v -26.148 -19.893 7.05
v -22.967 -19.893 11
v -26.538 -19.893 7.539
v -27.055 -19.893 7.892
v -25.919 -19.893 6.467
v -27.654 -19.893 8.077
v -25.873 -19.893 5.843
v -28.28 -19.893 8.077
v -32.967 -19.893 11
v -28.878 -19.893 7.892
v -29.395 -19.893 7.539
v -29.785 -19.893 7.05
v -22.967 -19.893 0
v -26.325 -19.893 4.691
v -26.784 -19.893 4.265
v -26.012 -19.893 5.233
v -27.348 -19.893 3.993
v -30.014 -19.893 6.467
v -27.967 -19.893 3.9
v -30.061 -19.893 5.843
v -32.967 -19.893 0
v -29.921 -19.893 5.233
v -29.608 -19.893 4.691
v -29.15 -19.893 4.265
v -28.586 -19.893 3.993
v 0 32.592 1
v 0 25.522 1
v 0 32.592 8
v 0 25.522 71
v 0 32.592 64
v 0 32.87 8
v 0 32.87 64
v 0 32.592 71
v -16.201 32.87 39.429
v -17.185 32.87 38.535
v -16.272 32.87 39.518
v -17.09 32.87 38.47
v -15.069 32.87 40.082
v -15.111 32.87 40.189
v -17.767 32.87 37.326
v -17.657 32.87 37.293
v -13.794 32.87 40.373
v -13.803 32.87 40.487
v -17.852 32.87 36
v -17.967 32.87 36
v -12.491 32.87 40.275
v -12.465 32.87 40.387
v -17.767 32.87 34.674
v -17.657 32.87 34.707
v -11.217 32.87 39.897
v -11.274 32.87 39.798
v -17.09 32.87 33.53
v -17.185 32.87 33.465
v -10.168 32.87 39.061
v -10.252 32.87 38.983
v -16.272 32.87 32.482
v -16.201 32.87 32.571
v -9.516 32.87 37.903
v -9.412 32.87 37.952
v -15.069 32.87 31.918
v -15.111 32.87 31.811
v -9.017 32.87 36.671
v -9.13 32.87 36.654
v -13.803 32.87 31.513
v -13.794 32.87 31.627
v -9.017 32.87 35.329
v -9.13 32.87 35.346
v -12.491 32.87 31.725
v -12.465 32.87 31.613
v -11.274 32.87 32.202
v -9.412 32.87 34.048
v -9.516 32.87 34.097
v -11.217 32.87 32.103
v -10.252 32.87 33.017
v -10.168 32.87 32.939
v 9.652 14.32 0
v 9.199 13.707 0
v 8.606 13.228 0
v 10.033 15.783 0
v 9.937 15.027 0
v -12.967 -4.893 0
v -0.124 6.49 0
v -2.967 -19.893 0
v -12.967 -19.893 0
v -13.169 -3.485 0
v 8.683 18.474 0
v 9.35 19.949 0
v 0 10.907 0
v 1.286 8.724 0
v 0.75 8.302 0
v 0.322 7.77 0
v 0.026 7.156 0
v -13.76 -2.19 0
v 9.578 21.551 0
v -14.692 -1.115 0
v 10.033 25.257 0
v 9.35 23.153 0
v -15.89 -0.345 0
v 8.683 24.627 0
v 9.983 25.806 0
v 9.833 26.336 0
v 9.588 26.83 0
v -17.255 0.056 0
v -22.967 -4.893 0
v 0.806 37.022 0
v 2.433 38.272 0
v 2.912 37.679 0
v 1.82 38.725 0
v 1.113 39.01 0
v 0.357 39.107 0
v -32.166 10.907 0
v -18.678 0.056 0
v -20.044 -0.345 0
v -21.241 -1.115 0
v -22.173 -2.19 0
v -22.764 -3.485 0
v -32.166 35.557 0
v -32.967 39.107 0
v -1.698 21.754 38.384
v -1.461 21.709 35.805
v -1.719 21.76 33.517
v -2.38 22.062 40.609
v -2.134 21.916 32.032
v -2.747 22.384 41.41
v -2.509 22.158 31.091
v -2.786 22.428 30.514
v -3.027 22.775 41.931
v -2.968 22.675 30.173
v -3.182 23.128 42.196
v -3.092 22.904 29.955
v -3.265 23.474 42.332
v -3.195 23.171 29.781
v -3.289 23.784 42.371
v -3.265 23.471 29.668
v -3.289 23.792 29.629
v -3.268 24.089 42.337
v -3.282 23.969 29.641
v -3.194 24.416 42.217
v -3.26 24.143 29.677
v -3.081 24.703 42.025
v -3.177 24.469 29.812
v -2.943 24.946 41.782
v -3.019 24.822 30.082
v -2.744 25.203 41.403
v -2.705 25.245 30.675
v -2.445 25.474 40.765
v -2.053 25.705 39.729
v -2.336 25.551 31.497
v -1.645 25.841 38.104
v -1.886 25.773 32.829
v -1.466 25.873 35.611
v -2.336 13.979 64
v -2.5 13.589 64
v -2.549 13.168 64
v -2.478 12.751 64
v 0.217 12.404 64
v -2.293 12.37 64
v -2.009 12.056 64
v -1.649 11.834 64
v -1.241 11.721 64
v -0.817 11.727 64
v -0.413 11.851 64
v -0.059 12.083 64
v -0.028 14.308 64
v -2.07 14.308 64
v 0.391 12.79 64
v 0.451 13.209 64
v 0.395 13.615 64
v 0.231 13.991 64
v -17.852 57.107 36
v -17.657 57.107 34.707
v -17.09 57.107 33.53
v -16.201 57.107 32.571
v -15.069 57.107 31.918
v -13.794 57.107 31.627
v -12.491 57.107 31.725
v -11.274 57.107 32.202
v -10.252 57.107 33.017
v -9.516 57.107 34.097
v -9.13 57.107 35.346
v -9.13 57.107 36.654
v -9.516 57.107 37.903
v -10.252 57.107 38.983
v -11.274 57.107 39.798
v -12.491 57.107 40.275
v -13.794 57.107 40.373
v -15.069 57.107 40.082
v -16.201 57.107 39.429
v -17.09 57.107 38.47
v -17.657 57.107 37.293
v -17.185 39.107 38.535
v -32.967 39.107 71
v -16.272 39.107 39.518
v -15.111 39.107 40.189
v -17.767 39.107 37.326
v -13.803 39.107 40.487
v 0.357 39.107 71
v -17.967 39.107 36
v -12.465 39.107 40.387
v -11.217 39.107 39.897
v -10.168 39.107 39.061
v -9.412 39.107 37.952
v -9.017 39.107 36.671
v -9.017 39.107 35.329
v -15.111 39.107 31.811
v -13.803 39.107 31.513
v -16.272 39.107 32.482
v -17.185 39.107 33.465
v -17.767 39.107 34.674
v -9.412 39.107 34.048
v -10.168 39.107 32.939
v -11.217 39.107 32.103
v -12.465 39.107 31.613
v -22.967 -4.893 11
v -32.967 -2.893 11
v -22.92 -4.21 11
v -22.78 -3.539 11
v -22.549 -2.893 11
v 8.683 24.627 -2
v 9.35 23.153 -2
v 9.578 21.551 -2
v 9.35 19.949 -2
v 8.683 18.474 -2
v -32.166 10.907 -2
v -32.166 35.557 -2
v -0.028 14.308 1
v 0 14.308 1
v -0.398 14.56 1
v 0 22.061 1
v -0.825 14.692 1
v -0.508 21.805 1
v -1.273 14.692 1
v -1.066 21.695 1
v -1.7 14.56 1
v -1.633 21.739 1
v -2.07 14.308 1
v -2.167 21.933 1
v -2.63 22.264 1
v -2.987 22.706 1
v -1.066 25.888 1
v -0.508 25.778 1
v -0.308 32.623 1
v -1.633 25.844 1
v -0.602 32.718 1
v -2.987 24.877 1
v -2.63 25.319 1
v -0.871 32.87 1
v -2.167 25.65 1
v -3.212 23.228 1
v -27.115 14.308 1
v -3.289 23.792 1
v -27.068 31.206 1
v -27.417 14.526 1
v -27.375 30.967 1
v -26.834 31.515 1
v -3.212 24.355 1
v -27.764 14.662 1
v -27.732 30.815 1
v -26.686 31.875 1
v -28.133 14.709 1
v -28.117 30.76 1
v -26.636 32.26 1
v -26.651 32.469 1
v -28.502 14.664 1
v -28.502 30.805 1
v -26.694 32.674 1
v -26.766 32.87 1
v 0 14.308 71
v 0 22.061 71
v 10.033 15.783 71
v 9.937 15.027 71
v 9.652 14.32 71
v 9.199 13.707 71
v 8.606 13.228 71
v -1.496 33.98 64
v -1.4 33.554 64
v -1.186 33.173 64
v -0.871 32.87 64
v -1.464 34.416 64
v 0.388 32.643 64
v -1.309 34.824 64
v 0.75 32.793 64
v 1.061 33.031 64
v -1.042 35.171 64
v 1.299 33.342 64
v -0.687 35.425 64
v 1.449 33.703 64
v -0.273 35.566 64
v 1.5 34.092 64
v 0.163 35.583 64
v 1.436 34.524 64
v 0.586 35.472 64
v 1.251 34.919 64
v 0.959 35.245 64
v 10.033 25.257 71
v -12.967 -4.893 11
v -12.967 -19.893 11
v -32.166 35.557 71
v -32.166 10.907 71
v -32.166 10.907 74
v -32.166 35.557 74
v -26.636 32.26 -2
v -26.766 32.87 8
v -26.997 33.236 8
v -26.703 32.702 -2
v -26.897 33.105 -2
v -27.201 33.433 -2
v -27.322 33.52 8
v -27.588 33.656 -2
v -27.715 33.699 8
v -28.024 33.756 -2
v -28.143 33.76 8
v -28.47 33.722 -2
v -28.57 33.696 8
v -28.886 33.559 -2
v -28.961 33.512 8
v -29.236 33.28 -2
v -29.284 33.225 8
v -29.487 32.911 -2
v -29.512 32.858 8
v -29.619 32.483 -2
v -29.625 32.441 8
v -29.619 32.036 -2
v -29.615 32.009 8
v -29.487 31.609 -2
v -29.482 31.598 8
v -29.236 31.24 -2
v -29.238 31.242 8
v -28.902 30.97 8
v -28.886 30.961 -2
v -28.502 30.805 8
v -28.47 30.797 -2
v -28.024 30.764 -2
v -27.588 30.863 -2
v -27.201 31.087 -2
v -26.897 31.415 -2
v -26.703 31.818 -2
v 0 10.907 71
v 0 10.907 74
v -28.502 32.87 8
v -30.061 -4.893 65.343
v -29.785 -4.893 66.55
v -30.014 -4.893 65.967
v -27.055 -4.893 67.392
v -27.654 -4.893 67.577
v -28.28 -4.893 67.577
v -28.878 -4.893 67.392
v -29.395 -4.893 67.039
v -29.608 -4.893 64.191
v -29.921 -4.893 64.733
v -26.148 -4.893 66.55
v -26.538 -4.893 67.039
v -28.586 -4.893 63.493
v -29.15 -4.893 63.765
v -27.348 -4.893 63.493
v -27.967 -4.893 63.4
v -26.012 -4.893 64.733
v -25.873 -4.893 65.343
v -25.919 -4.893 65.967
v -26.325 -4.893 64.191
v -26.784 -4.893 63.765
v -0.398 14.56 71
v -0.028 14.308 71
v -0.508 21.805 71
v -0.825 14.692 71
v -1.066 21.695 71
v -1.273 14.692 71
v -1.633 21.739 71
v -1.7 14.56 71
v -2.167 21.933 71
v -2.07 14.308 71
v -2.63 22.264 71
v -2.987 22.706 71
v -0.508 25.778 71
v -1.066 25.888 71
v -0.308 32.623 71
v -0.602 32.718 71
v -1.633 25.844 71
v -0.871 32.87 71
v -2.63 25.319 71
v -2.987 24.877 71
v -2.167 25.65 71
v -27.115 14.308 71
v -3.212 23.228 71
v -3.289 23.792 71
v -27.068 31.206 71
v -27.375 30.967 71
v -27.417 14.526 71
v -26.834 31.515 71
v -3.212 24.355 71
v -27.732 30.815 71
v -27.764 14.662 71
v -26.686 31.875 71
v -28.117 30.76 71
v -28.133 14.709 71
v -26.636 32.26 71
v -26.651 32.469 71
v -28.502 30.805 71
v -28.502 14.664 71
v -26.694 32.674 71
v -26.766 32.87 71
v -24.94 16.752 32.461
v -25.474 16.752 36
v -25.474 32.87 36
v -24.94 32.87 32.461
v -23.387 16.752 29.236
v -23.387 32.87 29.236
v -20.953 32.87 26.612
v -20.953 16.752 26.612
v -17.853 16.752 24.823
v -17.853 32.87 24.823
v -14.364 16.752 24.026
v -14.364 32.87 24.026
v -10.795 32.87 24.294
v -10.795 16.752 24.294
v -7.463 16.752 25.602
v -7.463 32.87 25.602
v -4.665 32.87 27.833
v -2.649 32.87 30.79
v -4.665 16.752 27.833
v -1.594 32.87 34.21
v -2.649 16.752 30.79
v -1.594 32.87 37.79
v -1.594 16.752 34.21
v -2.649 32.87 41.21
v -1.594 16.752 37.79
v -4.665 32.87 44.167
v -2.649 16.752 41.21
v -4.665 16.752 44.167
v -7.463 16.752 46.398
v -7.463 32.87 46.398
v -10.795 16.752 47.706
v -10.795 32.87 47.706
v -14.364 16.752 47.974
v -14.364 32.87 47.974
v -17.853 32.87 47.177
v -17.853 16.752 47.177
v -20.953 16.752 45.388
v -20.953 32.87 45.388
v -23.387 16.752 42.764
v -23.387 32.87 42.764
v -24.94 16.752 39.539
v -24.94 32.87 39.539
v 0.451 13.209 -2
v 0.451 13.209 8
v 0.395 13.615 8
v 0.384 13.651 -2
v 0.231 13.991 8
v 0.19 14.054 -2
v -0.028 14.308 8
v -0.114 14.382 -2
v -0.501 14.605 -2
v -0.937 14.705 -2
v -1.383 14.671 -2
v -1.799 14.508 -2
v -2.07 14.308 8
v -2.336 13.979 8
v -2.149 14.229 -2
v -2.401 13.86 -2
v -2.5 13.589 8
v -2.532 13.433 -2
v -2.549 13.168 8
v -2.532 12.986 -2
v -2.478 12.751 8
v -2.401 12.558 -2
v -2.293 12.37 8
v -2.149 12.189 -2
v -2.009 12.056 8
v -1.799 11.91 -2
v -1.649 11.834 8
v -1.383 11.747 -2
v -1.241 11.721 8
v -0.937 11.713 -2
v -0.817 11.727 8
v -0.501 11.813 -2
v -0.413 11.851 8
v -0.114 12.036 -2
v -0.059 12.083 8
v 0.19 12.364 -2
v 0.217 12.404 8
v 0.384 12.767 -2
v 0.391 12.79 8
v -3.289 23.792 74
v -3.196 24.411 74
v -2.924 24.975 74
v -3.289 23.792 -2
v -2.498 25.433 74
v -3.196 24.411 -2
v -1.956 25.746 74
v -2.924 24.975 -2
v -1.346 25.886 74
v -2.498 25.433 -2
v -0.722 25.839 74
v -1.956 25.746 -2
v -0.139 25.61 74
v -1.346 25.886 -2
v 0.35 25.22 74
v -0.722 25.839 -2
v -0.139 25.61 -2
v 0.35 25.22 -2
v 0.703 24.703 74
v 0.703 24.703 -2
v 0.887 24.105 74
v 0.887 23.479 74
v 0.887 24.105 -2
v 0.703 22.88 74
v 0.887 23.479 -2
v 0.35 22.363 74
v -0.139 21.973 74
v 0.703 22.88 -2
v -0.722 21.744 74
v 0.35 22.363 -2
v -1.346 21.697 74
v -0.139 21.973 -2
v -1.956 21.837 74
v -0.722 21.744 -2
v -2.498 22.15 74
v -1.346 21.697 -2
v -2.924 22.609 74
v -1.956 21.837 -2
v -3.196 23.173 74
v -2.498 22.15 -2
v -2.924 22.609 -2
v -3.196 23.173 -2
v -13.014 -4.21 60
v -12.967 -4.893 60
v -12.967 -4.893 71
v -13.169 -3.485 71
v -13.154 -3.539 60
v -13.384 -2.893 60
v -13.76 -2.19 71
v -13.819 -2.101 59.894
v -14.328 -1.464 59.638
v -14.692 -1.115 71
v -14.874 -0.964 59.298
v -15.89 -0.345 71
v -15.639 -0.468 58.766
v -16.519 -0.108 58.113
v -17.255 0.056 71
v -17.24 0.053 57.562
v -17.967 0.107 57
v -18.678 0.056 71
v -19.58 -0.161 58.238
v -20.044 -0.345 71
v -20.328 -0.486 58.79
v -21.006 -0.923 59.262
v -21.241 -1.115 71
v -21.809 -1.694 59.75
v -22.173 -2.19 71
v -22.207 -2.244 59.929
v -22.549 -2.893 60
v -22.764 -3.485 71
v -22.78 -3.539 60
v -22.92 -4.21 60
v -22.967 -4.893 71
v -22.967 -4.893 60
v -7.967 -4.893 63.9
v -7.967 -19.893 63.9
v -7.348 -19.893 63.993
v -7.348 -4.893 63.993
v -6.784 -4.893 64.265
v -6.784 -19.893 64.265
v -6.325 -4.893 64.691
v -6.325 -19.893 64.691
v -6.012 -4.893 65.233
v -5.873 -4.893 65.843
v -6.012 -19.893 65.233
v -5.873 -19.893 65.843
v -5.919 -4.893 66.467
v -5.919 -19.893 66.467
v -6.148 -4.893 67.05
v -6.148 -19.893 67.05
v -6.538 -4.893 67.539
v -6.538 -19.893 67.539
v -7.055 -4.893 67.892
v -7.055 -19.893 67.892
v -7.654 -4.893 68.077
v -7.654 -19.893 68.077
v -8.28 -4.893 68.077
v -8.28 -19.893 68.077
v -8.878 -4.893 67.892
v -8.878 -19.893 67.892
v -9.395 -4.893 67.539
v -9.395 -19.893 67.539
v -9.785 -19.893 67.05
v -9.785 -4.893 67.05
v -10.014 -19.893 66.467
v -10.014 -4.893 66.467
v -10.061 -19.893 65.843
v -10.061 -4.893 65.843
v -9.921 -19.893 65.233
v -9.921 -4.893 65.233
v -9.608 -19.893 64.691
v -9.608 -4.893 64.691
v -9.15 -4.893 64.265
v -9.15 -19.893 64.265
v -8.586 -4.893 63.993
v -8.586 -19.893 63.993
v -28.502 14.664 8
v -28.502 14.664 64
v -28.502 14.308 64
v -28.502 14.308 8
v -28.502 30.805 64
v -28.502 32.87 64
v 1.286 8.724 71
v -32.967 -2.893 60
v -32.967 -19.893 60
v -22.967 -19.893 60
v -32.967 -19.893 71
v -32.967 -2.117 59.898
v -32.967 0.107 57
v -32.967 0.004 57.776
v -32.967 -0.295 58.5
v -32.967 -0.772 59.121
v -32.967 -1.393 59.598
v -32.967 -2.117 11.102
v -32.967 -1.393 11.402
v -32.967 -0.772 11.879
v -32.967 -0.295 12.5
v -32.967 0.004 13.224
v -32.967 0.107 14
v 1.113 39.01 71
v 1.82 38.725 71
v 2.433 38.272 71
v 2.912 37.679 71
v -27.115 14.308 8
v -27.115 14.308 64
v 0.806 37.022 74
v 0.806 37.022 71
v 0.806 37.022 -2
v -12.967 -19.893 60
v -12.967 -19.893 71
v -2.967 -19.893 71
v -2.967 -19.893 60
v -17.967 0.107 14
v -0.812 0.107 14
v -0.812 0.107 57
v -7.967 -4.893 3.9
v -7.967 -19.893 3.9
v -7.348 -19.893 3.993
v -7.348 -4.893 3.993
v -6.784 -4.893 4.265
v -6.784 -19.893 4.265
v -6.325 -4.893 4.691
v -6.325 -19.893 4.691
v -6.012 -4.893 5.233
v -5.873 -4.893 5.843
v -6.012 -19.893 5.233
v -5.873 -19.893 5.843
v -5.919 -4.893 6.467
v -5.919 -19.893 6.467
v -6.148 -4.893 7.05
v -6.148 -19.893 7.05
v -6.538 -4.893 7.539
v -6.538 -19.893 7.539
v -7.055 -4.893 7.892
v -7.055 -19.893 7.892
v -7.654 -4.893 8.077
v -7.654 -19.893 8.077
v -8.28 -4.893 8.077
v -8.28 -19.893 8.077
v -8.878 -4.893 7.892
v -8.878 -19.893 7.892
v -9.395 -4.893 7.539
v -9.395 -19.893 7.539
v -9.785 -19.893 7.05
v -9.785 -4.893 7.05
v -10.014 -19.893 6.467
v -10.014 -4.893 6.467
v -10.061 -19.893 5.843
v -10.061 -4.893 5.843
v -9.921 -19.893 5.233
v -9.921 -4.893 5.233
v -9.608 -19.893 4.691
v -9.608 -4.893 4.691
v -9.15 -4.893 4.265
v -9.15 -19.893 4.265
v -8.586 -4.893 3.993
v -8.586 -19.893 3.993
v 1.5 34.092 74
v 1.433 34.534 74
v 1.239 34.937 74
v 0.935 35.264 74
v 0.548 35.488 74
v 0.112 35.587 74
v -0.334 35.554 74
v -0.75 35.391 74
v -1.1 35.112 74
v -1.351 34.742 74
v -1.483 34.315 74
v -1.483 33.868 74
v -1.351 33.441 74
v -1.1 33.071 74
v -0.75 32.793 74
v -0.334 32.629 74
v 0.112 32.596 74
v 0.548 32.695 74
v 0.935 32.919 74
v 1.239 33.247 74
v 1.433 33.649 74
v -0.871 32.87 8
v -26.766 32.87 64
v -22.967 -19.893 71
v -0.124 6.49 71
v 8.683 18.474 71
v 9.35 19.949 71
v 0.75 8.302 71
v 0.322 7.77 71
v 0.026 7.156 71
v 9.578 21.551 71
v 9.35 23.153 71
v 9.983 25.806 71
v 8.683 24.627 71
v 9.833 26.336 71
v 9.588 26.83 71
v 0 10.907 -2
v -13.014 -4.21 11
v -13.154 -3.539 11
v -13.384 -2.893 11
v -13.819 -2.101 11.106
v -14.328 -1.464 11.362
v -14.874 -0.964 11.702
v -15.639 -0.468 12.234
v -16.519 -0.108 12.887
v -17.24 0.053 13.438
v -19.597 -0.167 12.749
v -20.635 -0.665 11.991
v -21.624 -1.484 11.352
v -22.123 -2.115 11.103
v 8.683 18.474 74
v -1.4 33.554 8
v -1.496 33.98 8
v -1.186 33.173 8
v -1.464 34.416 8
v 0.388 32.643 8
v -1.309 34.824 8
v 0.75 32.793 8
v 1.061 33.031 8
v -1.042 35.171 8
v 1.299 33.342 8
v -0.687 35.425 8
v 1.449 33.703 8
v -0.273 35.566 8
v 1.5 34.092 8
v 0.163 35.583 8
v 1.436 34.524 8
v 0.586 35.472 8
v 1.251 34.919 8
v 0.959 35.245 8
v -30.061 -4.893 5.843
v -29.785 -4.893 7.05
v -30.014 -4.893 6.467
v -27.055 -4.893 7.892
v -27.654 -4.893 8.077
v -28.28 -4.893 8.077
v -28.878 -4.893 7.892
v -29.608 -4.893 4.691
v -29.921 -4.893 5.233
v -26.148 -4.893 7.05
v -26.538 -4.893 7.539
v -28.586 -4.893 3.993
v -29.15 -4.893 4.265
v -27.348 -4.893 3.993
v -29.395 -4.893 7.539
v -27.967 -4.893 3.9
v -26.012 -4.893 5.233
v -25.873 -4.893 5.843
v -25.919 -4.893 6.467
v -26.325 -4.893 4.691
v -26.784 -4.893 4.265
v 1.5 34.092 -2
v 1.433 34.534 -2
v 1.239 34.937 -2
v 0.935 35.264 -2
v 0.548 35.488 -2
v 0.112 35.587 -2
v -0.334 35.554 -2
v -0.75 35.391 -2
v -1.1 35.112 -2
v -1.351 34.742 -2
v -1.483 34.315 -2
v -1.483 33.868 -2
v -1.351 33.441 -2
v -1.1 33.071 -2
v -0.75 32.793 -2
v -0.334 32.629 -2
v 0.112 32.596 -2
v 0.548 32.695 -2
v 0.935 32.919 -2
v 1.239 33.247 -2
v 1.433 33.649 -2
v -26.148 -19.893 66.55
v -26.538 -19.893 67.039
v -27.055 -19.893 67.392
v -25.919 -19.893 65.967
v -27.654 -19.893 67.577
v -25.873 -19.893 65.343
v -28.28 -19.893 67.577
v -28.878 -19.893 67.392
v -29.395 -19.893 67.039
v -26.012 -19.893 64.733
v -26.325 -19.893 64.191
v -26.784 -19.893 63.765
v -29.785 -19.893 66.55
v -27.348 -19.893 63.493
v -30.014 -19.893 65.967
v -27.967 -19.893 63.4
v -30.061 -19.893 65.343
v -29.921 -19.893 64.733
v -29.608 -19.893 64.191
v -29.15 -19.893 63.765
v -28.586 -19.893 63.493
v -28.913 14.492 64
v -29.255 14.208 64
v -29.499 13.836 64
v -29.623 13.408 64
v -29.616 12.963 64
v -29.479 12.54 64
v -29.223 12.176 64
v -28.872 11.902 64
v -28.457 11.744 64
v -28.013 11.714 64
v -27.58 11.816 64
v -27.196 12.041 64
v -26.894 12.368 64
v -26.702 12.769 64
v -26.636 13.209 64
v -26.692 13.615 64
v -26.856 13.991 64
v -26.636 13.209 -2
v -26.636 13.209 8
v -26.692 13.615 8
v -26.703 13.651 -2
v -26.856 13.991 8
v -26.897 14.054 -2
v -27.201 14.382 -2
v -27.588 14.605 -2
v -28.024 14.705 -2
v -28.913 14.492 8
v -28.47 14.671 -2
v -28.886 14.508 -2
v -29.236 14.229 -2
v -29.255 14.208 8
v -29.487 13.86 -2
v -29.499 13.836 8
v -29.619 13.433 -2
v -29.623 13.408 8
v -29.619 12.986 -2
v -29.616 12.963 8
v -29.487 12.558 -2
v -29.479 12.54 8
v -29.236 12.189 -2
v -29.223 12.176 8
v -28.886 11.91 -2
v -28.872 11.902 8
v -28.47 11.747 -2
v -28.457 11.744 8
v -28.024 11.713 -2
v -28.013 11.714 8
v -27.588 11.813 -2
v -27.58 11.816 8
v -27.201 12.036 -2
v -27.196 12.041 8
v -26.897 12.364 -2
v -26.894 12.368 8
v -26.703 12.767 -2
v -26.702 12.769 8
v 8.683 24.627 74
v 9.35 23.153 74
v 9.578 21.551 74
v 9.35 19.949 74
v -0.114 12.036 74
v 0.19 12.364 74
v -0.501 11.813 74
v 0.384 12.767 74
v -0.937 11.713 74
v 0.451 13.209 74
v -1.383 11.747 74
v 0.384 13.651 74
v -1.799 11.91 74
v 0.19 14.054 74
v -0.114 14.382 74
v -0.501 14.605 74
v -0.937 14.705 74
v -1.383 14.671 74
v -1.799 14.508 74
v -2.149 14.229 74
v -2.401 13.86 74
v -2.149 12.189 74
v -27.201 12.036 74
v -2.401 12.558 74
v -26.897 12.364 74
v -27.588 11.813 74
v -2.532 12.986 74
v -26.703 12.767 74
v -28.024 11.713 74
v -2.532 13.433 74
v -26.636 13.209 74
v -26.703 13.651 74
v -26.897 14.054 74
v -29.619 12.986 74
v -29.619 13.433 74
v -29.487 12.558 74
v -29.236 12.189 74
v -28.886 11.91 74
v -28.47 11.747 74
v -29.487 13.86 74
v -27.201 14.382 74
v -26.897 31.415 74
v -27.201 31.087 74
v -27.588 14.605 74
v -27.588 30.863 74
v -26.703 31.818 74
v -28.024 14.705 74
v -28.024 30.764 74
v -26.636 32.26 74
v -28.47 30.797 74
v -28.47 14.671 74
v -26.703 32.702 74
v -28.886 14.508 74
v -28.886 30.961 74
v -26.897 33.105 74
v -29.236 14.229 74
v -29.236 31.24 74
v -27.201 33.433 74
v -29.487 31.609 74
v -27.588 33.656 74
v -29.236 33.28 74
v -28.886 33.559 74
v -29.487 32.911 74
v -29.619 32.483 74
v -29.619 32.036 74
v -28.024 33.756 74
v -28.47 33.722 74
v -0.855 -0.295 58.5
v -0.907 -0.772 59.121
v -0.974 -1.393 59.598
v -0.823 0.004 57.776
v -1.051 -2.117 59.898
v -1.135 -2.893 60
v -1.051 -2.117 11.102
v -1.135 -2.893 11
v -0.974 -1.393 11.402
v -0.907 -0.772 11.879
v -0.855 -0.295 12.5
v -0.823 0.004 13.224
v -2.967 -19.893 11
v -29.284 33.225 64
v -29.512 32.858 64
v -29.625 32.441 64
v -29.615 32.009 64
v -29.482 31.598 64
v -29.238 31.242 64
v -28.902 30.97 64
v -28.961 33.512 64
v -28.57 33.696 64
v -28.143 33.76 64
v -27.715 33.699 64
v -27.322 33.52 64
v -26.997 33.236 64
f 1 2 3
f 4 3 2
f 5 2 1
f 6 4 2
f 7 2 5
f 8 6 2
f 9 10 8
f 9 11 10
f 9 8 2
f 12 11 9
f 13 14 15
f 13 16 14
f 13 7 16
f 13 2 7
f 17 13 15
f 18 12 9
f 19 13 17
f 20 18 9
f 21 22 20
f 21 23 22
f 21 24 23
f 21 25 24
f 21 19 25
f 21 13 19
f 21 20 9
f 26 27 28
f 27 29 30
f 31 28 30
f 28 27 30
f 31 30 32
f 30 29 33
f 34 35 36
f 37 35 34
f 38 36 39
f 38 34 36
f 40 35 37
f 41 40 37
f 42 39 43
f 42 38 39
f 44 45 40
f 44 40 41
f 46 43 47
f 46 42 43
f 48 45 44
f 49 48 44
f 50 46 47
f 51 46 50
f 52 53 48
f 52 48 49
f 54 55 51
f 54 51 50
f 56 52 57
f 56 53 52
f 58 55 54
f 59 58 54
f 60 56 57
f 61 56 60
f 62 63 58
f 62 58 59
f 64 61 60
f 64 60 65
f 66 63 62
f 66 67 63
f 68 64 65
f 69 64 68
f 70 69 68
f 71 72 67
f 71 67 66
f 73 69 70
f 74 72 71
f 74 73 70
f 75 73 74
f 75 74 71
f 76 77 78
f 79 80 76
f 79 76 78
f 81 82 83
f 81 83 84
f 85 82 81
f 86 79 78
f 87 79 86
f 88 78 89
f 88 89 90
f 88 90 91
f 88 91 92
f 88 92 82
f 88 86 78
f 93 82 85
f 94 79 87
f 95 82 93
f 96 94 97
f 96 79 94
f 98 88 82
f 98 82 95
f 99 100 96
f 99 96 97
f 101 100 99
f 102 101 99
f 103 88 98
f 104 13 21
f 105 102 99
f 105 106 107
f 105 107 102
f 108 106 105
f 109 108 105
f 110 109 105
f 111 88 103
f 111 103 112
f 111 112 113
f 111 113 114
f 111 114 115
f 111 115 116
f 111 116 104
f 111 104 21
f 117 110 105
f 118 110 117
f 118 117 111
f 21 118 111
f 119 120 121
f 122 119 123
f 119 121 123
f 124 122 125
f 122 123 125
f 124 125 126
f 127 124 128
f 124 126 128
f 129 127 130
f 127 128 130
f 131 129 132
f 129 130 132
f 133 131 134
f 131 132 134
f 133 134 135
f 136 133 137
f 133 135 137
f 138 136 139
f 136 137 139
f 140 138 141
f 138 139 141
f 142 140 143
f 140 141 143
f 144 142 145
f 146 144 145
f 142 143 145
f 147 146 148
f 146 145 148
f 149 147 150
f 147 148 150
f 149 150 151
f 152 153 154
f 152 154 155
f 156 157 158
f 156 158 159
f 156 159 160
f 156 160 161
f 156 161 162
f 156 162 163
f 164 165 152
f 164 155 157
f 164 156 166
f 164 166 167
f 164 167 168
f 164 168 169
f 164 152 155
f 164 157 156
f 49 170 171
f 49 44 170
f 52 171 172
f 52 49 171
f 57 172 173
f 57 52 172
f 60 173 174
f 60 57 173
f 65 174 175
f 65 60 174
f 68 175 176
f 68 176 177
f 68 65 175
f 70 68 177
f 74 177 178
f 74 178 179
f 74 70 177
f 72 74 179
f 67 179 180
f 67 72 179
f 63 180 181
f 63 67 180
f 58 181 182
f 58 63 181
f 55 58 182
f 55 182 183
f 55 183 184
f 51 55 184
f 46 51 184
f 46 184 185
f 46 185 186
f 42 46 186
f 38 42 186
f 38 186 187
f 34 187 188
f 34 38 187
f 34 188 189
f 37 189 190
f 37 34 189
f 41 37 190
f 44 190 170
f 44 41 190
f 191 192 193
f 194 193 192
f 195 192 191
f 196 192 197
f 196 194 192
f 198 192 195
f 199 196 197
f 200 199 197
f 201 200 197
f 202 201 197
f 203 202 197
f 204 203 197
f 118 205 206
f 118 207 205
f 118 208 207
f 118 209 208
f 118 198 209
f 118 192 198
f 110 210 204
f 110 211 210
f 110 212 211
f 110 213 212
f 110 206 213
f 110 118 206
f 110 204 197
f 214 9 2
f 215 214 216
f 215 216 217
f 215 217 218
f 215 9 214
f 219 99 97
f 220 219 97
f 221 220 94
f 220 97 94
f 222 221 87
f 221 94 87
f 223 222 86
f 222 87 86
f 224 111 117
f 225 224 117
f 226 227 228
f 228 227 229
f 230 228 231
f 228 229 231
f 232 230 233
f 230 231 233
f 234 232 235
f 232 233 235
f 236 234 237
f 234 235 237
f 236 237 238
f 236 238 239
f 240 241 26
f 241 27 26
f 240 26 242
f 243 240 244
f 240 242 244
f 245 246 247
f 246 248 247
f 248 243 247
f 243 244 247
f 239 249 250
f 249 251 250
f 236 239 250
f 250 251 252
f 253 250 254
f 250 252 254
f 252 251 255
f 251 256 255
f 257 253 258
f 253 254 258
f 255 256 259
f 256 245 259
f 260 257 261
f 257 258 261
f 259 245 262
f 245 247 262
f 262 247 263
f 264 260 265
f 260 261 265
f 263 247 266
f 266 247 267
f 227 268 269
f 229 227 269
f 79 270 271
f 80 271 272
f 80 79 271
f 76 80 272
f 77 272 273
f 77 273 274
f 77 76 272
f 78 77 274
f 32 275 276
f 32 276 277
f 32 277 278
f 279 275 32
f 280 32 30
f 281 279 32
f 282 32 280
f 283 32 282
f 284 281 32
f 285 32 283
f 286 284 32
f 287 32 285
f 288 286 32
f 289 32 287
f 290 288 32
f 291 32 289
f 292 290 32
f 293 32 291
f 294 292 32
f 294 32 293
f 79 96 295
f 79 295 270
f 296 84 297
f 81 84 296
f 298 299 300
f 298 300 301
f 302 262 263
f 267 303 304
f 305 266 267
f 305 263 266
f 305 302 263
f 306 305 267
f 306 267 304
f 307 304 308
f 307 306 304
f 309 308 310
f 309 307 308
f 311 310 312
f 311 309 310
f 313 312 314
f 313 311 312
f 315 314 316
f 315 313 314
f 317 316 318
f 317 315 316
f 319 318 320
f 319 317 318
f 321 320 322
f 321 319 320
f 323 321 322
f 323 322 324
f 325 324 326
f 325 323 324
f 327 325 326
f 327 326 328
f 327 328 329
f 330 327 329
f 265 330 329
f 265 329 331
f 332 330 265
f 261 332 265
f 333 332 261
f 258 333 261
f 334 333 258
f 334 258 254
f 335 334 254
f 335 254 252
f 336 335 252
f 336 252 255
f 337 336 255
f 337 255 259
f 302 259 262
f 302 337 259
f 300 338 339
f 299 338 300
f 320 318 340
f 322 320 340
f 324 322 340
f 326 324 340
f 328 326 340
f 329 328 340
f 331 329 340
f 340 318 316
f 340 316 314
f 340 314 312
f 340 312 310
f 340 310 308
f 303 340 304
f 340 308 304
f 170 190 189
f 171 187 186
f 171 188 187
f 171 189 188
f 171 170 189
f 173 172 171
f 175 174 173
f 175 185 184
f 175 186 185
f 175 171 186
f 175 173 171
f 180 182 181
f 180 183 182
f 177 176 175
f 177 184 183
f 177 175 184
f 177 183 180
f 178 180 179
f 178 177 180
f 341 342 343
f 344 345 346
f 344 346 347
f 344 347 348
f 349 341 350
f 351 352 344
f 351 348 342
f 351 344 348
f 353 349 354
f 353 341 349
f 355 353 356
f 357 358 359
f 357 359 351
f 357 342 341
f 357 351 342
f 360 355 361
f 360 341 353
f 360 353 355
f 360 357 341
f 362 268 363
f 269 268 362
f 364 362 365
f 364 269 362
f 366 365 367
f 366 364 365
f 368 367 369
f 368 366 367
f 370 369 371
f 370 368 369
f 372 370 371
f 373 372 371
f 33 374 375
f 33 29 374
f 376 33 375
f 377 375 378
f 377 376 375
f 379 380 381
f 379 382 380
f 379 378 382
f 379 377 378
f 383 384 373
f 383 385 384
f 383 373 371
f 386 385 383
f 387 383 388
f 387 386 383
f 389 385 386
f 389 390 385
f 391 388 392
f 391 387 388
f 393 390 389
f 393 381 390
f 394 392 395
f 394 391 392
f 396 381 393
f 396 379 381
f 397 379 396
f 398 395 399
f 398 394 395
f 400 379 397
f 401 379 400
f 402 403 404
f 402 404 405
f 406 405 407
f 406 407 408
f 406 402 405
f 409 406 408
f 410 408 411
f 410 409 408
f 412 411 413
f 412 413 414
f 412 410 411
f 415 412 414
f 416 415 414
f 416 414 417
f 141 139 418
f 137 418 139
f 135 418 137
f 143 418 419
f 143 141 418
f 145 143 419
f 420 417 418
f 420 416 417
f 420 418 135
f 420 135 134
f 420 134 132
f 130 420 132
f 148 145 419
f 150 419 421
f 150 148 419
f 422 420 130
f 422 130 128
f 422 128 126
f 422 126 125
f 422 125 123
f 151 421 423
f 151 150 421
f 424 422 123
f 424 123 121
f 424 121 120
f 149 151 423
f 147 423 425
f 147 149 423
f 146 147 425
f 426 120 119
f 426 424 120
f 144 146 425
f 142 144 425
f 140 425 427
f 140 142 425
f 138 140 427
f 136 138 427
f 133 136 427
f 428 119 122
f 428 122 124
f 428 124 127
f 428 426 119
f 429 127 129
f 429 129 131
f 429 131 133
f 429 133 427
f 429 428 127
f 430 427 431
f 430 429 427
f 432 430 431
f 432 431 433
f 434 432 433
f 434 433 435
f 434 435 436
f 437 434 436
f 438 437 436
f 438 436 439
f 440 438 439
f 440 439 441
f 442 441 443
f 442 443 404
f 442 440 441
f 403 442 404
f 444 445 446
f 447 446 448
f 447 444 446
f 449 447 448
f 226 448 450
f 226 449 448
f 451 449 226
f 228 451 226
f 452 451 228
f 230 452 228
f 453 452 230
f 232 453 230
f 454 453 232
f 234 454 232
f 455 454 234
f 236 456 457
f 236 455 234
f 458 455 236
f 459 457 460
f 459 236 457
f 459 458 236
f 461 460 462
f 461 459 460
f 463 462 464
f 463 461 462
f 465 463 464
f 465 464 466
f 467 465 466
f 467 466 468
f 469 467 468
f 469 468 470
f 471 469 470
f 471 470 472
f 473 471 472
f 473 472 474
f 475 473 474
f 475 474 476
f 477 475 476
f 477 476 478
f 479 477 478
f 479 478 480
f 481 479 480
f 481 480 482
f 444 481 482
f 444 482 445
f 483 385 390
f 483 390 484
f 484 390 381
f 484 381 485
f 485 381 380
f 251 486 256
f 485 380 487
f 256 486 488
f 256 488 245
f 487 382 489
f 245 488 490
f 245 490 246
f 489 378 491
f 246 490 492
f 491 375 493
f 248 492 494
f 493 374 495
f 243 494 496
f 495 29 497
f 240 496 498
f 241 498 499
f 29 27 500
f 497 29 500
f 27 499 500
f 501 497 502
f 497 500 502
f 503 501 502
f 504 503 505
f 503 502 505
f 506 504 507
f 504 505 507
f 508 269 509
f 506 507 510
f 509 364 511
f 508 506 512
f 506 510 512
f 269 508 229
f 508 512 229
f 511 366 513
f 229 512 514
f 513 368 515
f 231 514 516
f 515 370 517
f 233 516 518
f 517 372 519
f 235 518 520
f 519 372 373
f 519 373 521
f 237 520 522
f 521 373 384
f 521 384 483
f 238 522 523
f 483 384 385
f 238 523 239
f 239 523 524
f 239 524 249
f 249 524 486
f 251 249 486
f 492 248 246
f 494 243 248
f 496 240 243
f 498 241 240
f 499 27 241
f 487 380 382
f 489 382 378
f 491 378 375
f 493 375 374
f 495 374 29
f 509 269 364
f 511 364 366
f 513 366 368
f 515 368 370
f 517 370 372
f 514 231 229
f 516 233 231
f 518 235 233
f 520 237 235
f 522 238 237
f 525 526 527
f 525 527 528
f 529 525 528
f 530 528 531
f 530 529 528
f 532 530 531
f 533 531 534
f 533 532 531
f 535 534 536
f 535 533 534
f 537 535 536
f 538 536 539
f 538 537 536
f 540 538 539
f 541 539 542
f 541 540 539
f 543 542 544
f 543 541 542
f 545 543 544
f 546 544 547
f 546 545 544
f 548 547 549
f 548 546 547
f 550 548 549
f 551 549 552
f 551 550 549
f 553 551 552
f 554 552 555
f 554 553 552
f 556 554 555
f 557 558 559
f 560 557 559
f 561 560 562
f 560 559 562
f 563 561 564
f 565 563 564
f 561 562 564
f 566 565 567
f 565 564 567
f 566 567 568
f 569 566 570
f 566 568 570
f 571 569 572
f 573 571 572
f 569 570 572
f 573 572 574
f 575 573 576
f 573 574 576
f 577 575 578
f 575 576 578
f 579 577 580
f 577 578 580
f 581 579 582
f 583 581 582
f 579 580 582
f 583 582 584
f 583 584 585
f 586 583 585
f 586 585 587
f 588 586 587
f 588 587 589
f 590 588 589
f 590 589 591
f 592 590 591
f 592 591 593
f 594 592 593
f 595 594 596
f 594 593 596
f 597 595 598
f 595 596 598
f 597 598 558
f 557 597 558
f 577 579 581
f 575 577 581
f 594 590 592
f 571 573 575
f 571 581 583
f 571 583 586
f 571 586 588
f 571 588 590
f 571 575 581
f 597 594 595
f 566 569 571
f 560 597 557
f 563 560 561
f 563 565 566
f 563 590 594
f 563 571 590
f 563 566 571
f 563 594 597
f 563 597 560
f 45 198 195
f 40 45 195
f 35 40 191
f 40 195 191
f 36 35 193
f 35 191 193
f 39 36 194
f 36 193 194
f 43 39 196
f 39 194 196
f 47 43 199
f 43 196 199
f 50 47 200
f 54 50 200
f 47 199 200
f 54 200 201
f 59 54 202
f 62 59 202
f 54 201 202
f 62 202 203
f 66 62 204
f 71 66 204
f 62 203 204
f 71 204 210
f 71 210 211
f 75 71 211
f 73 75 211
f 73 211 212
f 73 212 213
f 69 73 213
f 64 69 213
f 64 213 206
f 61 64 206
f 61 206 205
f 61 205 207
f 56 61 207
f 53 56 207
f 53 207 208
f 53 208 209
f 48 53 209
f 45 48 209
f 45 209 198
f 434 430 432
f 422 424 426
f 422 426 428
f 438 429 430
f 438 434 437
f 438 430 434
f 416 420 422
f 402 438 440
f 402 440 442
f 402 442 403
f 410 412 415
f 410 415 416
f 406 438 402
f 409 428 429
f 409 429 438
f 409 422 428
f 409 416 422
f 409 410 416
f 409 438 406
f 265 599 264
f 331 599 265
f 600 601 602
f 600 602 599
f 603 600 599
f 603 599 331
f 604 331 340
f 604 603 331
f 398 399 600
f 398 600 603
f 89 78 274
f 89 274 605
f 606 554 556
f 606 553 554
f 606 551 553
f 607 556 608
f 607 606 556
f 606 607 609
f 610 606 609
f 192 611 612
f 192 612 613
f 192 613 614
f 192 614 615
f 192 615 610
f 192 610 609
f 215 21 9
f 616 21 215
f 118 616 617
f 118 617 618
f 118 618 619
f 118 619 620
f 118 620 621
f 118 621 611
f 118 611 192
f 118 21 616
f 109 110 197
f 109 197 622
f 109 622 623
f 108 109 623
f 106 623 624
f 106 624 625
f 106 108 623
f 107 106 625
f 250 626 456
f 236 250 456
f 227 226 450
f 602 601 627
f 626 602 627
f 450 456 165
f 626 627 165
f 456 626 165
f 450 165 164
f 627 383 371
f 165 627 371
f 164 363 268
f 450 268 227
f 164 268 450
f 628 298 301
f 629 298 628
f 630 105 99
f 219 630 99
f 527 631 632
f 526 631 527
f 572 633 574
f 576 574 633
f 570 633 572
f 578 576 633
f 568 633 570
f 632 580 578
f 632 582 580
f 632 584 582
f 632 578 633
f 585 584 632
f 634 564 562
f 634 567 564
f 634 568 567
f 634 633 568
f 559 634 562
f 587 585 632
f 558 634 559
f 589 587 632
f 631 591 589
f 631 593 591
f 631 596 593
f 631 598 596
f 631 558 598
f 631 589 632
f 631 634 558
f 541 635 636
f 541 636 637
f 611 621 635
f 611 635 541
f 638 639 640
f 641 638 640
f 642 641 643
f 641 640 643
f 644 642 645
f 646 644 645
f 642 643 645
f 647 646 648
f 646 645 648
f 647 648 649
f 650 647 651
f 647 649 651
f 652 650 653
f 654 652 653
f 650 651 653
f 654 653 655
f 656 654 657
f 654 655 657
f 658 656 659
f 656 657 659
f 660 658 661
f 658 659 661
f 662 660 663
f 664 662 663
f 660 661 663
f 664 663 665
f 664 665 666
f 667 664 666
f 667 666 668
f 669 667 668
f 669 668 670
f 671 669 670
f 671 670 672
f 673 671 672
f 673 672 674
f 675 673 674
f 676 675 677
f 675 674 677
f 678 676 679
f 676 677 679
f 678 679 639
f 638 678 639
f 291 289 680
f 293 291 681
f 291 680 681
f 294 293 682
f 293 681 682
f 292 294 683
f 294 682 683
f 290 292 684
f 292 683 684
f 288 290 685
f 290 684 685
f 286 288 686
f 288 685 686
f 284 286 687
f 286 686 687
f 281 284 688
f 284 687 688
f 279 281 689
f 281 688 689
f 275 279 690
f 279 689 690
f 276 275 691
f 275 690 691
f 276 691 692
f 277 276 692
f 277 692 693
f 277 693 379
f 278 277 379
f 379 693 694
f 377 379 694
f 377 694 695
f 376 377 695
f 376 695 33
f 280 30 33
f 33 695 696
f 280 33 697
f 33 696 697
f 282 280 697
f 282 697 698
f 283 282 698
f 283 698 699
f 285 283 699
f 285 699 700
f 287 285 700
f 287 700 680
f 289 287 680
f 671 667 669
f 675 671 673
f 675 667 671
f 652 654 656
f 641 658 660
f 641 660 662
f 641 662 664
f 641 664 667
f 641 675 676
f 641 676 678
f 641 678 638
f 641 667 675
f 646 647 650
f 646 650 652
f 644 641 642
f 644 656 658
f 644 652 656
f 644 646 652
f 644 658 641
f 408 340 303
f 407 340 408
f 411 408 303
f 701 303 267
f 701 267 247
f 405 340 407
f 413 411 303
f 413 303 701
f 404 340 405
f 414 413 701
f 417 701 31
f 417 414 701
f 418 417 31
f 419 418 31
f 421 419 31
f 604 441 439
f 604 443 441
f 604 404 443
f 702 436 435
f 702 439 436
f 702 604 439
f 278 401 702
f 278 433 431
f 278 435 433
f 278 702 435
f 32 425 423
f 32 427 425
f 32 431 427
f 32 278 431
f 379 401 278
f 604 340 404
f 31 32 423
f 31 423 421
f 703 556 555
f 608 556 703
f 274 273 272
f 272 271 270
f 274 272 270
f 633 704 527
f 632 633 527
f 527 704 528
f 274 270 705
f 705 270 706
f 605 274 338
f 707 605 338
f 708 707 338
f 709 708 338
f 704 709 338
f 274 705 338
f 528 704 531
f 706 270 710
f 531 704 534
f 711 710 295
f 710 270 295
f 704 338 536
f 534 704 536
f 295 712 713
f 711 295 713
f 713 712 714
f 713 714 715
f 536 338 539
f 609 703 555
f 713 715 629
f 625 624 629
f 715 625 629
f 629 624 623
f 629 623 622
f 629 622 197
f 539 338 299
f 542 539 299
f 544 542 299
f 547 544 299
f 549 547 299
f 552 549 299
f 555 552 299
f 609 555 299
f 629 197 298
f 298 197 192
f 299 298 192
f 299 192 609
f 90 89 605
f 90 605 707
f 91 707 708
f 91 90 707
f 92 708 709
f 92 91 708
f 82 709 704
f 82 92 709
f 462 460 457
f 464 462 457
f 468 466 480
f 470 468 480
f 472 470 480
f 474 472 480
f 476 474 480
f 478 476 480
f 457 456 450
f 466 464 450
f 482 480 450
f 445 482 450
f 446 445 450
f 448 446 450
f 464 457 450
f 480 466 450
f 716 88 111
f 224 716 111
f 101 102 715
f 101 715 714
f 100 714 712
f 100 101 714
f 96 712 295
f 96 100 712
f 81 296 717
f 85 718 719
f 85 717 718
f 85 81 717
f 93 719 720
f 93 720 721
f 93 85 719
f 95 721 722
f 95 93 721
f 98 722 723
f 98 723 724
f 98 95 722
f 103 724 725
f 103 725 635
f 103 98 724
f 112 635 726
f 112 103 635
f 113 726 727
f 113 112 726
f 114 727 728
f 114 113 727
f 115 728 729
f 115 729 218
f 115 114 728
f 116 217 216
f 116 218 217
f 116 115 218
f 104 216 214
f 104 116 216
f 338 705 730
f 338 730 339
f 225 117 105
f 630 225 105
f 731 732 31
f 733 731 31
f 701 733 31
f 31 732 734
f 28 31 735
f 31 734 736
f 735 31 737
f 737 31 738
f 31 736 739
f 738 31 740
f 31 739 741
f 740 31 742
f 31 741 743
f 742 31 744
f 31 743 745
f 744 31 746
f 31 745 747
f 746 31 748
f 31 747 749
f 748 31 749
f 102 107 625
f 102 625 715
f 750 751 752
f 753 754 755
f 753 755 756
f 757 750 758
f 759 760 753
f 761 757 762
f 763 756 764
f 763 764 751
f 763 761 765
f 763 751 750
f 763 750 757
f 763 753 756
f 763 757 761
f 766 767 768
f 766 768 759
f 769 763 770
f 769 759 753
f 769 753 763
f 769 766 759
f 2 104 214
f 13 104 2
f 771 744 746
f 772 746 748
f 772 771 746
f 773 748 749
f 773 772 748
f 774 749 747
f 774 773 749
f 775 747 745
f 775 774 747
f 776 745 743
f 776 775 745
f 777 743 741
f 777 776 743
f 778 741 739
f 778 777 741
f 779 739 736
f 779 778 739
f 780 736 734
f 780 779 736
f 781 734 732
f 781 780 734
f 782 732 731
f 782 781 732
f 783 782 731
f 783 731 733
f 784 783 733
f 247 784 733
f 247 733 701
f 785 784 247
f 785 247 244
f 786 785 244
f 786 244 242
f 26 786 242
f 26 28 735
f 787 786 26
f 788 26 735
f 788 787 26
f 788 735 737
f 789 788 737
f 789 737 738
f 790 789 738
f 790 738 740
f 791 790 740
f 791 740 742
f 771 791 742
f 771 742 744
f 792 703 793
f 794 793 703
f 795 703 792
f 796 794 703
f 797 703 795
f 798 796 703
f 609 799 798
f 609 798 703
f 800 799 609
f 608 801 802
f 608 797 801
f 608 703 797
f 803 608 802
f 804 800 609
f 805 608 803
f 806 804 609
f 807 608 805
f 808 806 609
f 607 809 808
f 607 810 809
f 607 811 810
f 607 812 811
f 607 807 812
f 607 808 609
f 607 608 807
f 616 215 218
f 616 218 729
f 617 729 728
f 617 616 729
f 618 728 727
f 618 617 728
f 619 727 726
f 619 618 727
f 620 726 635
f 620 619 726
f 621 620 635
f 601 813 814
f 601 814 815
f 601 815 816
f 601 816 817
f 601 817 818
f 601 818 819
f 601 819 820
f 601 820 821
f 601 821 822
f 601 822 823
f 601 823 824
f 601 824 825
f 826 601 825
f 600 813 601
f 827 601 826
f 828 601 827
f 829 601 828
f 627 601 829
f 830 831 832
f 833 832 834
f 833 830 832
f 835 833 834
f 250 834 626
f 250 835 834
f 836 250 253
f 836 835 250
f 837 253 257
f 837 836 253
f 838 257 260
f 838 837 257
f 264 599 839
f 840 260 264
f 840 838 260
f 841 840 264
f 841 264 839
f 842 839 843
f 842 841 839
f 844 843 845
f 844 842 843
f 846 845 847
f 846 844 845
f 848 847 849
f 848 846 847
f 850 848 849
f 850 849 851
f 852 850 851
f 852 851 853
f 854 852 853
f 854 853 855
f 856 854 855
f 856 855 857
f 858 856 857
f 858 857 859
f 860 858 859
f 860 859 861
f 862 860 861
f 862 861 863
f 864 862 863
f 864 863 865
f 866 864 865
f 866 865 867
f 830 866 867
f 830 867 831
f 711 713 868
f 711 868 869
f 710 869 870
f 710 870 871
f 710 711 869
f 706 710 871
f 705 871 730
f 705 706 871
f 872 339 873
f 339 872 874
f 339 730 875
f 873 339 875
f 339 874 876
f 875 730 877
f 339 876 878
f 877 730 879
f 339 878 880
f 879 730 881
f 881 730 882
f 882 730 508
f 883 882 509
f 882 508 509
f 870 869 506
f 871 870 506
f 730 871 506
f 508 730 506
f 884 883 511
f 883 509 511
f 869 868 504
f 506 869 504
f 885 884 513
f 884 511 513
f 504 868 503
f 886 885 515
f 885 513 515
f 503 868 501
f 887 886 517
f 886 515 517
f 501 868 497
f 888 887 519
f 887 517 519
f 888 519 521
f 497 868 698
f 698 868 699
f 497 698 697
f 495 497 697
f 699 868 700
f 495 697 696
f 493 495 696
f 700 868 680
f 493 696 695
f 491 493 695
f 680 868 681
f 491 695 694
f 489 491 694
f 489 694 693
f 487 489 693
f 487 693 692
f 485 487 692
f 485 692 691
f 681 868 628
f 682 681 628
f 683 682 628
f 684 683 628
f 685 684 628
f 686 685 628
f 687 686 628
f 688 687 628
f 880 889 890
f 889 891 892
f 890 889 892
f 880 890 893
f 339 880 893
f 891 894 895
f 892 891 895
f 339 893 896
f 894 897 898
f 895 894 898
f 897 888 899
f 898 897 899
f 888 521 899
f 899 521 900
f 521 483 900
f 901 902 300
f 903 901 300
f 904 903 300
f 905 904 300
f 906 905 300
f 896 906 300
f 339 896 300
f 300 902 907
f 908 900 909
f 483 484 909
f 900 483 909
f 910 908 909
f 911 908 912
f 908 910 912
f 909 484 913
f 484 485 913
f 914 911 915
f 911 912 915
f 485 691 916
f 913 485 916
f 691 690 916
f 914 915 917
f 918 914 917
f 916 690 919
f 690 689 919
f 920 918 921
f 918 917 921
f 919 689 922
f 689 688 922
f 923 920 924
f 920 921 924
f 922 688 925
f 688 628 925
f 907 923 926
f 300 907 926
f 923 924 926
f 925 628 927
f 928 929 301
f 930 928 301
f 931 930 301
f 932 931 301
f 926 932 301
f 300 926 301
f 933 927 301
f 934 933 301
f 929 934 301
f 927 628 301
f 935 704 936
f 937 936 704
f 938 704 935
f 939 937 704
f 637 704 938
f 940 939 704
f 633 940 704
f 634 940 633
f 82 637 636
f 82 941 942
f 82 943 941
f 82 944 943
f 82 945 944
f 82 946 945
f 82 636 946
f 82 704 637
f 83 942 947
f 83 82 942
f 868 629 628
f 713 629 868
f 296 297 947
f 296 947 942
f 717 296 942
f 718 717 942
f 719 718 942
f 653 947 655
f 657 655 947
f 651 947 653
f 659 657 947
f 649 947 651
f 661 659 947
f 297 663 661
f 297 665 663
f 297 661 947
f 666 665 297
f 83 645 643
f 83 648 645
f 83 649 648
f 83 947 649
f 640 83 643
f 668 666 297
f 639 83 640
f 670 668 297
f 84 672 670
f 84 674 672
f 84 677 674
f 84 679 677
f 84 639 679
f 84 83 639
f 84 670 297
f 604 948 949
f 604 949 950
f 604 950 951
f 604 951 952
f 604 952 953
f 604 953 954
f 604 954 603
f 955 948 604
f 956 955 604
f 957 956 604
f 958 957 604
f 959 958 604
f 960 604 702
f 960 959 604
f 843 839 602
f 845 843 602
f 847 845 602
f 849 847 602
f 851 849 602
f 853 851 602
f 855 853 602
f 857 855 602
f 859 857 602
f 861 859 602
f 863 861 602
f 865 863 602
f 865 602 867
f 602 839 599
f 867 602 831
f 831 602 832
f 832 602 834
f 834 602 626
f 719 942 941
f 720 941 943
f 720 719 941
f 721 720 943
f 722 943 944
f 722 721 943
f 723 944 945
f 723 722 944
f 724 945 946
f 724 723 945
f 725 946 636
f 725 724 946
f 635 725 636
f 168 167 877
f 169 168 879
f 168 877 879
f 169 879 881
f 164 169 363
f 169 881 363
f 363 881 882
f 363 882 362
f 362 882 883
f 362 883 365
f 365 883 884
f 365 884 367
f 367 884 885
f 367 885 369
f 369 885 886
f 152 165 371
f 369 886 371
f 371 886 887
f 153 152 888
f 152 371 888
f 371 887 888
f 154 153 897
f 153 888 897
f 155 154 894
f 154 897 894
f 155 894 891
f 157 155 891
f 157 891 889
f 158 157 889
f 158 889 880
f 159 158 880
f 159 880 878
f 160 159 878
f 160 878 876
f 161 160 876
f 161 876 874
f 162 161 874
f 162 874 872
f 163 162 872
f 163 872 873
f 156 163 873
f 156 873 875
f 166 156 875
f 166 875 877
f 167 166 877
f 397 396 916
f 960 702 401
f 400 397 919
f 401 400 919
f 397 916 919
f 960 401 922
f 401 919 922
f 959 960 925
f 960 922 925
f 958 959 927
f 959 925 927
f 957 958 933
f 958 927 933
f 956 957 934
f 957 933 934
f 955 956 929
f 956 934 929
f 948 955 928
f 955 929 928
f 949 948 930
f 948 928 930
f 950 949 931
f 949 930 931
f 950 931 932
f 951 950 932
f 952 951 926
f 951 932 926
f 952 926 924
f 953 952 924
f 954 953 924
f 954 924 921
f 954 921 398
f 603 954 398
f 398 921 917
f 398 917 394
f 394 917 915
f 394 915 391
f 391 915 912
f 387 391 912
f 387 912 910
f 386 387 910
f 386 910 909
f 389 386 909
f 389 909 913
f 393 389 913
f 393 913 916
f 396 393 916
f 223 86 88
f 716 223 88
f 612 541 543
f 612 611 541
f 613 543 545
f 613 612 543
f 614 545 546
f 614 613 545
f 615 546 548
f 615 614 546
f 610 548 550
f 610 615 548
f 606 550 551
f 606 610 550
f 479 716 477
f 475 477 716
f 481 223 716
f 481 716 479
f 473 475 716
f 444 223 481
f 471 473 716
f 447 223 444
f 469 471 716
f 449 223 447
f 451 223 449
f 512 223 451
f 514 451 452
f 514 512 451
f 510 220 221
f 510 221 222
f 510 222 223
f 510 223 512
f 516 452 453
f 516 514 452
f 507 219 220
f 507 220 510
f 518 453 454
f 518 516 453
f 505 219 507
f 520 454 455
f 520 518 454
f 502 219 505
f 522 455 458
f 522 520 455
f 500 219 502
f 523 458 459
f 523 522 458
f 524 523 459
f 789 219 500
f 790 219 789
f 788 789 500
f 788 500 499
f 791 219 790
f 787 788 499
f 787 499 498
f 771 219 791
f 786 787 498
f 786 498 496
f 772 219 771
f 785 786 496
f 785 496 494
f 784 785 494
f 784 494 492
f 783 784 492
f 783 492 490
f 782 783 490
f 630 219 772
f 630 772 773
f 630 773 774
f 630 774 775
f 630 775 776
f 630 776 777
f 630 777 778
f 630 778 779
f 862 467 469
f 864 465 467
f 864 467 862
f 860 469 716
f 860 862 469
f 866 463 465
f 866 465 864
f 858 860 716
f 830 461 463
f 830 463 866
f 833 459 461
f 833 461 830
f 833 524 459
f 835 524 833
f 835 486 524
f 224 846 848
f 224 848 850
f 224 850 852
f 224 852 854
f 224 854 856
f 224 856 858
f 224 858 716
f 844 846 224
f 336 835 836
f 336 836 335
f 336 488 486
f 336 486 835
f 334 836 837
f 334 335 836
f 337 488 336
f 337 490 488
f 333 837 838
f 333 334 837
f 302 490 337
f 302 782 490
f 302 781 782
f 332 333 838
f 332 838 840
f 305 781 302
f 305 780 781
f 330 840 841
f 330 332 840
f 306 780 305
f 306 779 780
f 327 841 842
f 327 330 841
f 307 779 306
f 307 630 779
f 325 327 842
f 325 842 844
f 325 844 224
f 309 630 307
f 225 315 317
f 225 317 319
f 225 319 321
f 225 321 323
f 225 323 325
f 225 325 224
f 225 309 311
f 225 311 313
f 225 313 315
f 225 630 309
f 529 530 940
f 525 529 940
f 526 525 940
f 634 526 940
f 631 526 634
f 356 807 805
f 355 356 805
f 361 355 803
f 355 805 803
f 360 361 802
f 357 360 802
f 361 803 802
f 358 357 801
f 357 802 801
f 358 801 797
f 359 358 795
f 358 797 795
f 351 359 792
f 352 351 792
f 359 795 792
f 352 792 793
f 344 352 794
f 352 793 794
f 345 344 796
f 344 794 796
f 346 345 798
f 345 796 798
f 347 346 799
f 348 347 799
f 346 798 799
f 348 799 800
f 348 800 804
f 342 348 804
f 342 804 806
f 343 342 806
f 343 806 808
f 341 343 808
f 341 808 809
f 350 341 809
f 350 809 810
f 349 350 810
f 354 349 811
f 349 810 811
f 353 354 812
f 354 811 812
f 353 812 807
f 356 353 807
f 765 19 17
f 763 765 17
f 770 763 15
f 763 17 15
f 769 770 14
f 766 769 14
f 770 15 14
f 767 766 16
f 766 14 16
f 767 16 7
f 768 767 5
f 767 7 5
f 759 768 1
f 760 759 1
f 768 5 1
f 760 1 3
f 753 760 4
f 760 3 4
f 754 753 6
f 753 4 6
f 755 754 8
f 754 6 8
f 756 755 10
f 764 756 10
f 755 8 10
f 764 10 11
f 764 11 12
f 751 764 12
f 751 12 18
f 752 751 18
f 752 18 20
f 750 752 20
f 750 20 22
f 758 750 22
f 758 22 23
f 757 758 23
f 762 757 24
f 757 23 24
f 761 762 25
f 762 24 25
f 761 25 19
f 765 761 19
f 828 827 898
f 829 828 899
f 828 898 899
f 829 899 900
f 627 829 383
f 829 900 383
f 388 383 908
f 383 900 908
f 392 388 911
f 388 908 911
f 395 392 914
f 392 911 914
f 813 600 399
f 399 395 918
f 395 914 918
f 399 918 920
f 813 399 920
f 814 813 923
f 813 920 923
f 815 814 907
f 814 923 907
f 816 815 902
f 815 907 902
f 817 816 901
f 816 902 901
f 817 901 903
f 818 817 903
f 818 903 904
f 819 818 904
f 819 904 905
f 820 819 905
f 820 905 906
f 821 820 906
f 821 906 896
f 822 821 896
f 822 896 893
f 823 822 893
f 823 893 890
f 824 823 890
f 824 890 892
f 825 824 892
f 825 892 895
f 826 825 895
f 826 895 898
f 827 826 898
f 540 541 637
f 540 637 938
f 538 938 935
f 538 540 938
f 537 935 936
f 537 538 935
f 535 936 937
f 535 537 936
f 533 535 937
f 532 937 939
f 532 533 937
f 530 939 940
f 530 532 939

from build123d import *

# Parameters (mm, degrees)
EXTRUDE_1_DEPTH     = 71
CUT_EXTRUDE_2_DEPTH = 71
SKETCH_3_W          = 28.502340284
SKETCH_3_H          = 18.562195974
CUT_EXTRUDE_3_DEPTH = 71
EXTRUDE_4_DEPTH     = 3
SKETCH_5_R          = 1.5
CUT_EXTRUDE_5_DEPTH = 10
SKETCH_6_R          = 4.5
CUT_EXTRUDE_6_DEPTH = 10
SKETCH_8_R          = 2.1
CUT_EXTRUDE_7_DEPTH = 15
SKETCH_9_R          = 2.1
CUT_EXTRUDE_8_DEPTH = 101.617881054


with BuildPart() as part:
    # 草图1 → 拉伸1 (new body)
    with BuildSketch(Plane.XY):
        with BuildLine():
            Line((-32.966640689, -19.89344536), (-32.966640689, 39.10655464))
            Line((-32.966640689, 39.10655464), (0.356973729, 39.10655464))
            ThreePointArc((0.356973729, 39.10655464), (1.820381254, 38.725416686), (2.911948679, 37.678846917))
            Line((2.911948679, 37.678846917), (9.588334261, 26.829720346))
            ThreePointArc((9.588334261, 26.829720346), (9.919959807, 26.074457796), (10.033359311, 25.257428069))
            Line((10.033359311, 25.257428069), (10.033359311, 15.782940222))
            ThreePointArc((10.033359311, 15.782940222), (9.652221357, 14.319532697), (8.605651588, 13.227965272))
            Line((8.605651588, 13.227965272), (1.286230543, 8.723706168))
            ThreePointArc((1.286230543, 8.723706168), (0.321919702, 7.770494191), (-0.124217104, 6.490076126))
            Line((-0.124217104, 6.490076126), (-2.966640689, -19.89344536))
            Line((-2.966640689, -19.89344536), (-12.966640689, -19.89344536))
            Line((-12.966640689, -19.89344536), (-12.966640689, -4.89344536))
            ThreePointArc((-12.966640689, -4.89344536), (-17.966640689, 0.10655464), (-22.966640689, -4.89344536))
            Line((-22.966640689, -4.89344536), (-22.966640689, -19.89344536))
            Line((-22.966640689, -19.89344536), (-32.966640689, -19.89344536))
        make_face()
    extrude(amount=EXTRUDE_1_DEPTH)

    # 草图2 → 拉伸2 (cut)
    with BuildSketch(Plane.ZY.offset(32.966640689)):
        with BuildLine():
            Line((11, -19.89344536), (11, -2.89344536))
            ThreePointArc((11, -2.89344536), (11.878679656, -0.772125016), (14, 0.10655464))
            Line((14, 0.10655464), (57, 0.10655464))
            ThreePointArc((57, 0.10655464), (59.121320344, -0.772125016), (60, -2.89344536))
            Line((60, -2.89344536), (60, -19.89344536))
            Line((60, -19.89344536), (11, -19.89344536))
        make_face()
    extrude(amount=-CUT_EXTRUDE_2_DEPTH, mode=Mode.SUBTRACT)

    # 草图3 → 拉伸3 (cut)
    with BuildSketch(Plane.XY.offset(71)):
        with Locations((-14.251170142, 23.589261476)):
            Rectangle(SKETCH_3_W, SKETCH_3_H)
    extrude(amount=-CUT_EXTRUDE_3_DEPTH, mode=Mode.SUBTRACT)

    # 草图4 → 拉伸4 (add)
    with BuildSketch(Plane.XY.offset(71)):
        with BuildLine():
            Line((-32.165931594, 13.697564937), (-32.165931594, 35.556993091))
            Line((-32.165931594, 35.556993091), (0.806390202, 37.022429615))
            Line((0.806390202, 37.022429615), (8.68311152, 24.627279014))
            ThreePointArc((8.68311152, 24.627279014), (9.577922468, 21.550792247), (8.68311152, 18.47430548))
            Line((8.68311152, 18.47430548), (0, 10.907326517))
            Line((0, 10.907326517), (-32.165931594, 10.907326517))
            Line((-32.165931594, 10.907326517), (-32.165931594, 13.697564937))
        make_face()
    extrude_4 = extrude(amount=EXTRUDE_4_DEPTH)

    # 草图5 → 拉伸5 (cut)
    with BuildSketch(Plane.XY.offset(74)):
        with Locations((-28.135981152, 32.259760911)):
            Circle(SKETCH_5_R)
        with Locations((0, 34.091556567)):
            Circle(SKETCH_5_R)
        with Locations((-1.049162635, 13.209086096)):
            Circle(SKETCH_5_R)
        with Locations((-28.135981152, 13.209086096)):
            Circle(SKETCH_5_R)
    cut_extrude_5 = extrude(amount=-CUT_EXTRUDE_5_DEPTH, mode=Mode.SUBTRACT)

    # 镜向2: 拉伸4, 拉伸5 across plane
    add(extrude_4.mirror(Plane(origin=(0, 0, 36), x_dir=(1, 0, 0), z_dir=(0, 0, -1))))
    add(cut_extrude_5.mirror(Plane(origin=(0, 0, 36), x_dir=(1, 0, 0), z_dir=(0, 0, -1))), mode=Mode.SUBTRACT)

    # 草图6 → 拉伸6 (cut)
    with BuildSketch(Plane(origin=(0, 39.10655464, 0), x_dir=(1, 0, 0), z_dir=(0, 1, 0))):
        with Locations(Location((-13.466640689, -36, 0), (0, 0, 180))):
            Circle(SKETCH_6_R)
    extrude(amount=-CUT_EXTRUDE_6_DEPTH, mode=Mode.SUBTRACT)

    # 草图7 → 旋转1 (revolve)
    with BuildSketch(Plane(origin=(0, 0, 36), x_dir=(-1, 0, 0), z_dir=(0, 0, -1))):
        Polygon((17.851883619, 32.870359463), (25.473752014, 32.870359463), (25.473752014, 16.752081431), (13.466640689, 16.752081431), (13.466640689, 57.10655464), (17.851883619, 57.10655464), align=None)
    revolve(axis=Axis((-13.466640689, 60.856315585, 36), (0, -1, 0)))

    # 草图8 → 拉伸7 (cut)
    with BuildSketch(Plane.XZ.offset(19.89344536)):
        with Locations(Location((-27.966640689, 65.5, 0), (0, 0, 270))):
            Circle(SKETCH_8_R)
        with Locations(Location((-7.966640689, 66, 0), (0, 0, 270))):
            Circle(SKETCH_8_R)
        with Locations(Location((-27.966640689, 6, 0), (0, 0, 270))):
            Circle(SKETCH_8_R)
        with Locations(Location((-7.966640689, 6, 0), (0, 0, 270))):
            Circle(SKETCH_8_R)
    extrude(amount=-CUT_EXTRUDE_7_DEPTH, mode=Mode.SUBTRACT)

    # 草图9 → 拉伸8 (cut, through all)
    with BuildSketch(Plane(origin=(0, 0, -2), x_dir=(-1, 0, 0), z_dir=(0, 0, -1))):
        with Locations((1.189151156, 23.791556567)):
            Circle(SKETCH_9_R)
    extrude(amount=-CUT_EXTRUDE_8_DEPTH, mode=Mode.SUBTRACT)


solid = part.part
